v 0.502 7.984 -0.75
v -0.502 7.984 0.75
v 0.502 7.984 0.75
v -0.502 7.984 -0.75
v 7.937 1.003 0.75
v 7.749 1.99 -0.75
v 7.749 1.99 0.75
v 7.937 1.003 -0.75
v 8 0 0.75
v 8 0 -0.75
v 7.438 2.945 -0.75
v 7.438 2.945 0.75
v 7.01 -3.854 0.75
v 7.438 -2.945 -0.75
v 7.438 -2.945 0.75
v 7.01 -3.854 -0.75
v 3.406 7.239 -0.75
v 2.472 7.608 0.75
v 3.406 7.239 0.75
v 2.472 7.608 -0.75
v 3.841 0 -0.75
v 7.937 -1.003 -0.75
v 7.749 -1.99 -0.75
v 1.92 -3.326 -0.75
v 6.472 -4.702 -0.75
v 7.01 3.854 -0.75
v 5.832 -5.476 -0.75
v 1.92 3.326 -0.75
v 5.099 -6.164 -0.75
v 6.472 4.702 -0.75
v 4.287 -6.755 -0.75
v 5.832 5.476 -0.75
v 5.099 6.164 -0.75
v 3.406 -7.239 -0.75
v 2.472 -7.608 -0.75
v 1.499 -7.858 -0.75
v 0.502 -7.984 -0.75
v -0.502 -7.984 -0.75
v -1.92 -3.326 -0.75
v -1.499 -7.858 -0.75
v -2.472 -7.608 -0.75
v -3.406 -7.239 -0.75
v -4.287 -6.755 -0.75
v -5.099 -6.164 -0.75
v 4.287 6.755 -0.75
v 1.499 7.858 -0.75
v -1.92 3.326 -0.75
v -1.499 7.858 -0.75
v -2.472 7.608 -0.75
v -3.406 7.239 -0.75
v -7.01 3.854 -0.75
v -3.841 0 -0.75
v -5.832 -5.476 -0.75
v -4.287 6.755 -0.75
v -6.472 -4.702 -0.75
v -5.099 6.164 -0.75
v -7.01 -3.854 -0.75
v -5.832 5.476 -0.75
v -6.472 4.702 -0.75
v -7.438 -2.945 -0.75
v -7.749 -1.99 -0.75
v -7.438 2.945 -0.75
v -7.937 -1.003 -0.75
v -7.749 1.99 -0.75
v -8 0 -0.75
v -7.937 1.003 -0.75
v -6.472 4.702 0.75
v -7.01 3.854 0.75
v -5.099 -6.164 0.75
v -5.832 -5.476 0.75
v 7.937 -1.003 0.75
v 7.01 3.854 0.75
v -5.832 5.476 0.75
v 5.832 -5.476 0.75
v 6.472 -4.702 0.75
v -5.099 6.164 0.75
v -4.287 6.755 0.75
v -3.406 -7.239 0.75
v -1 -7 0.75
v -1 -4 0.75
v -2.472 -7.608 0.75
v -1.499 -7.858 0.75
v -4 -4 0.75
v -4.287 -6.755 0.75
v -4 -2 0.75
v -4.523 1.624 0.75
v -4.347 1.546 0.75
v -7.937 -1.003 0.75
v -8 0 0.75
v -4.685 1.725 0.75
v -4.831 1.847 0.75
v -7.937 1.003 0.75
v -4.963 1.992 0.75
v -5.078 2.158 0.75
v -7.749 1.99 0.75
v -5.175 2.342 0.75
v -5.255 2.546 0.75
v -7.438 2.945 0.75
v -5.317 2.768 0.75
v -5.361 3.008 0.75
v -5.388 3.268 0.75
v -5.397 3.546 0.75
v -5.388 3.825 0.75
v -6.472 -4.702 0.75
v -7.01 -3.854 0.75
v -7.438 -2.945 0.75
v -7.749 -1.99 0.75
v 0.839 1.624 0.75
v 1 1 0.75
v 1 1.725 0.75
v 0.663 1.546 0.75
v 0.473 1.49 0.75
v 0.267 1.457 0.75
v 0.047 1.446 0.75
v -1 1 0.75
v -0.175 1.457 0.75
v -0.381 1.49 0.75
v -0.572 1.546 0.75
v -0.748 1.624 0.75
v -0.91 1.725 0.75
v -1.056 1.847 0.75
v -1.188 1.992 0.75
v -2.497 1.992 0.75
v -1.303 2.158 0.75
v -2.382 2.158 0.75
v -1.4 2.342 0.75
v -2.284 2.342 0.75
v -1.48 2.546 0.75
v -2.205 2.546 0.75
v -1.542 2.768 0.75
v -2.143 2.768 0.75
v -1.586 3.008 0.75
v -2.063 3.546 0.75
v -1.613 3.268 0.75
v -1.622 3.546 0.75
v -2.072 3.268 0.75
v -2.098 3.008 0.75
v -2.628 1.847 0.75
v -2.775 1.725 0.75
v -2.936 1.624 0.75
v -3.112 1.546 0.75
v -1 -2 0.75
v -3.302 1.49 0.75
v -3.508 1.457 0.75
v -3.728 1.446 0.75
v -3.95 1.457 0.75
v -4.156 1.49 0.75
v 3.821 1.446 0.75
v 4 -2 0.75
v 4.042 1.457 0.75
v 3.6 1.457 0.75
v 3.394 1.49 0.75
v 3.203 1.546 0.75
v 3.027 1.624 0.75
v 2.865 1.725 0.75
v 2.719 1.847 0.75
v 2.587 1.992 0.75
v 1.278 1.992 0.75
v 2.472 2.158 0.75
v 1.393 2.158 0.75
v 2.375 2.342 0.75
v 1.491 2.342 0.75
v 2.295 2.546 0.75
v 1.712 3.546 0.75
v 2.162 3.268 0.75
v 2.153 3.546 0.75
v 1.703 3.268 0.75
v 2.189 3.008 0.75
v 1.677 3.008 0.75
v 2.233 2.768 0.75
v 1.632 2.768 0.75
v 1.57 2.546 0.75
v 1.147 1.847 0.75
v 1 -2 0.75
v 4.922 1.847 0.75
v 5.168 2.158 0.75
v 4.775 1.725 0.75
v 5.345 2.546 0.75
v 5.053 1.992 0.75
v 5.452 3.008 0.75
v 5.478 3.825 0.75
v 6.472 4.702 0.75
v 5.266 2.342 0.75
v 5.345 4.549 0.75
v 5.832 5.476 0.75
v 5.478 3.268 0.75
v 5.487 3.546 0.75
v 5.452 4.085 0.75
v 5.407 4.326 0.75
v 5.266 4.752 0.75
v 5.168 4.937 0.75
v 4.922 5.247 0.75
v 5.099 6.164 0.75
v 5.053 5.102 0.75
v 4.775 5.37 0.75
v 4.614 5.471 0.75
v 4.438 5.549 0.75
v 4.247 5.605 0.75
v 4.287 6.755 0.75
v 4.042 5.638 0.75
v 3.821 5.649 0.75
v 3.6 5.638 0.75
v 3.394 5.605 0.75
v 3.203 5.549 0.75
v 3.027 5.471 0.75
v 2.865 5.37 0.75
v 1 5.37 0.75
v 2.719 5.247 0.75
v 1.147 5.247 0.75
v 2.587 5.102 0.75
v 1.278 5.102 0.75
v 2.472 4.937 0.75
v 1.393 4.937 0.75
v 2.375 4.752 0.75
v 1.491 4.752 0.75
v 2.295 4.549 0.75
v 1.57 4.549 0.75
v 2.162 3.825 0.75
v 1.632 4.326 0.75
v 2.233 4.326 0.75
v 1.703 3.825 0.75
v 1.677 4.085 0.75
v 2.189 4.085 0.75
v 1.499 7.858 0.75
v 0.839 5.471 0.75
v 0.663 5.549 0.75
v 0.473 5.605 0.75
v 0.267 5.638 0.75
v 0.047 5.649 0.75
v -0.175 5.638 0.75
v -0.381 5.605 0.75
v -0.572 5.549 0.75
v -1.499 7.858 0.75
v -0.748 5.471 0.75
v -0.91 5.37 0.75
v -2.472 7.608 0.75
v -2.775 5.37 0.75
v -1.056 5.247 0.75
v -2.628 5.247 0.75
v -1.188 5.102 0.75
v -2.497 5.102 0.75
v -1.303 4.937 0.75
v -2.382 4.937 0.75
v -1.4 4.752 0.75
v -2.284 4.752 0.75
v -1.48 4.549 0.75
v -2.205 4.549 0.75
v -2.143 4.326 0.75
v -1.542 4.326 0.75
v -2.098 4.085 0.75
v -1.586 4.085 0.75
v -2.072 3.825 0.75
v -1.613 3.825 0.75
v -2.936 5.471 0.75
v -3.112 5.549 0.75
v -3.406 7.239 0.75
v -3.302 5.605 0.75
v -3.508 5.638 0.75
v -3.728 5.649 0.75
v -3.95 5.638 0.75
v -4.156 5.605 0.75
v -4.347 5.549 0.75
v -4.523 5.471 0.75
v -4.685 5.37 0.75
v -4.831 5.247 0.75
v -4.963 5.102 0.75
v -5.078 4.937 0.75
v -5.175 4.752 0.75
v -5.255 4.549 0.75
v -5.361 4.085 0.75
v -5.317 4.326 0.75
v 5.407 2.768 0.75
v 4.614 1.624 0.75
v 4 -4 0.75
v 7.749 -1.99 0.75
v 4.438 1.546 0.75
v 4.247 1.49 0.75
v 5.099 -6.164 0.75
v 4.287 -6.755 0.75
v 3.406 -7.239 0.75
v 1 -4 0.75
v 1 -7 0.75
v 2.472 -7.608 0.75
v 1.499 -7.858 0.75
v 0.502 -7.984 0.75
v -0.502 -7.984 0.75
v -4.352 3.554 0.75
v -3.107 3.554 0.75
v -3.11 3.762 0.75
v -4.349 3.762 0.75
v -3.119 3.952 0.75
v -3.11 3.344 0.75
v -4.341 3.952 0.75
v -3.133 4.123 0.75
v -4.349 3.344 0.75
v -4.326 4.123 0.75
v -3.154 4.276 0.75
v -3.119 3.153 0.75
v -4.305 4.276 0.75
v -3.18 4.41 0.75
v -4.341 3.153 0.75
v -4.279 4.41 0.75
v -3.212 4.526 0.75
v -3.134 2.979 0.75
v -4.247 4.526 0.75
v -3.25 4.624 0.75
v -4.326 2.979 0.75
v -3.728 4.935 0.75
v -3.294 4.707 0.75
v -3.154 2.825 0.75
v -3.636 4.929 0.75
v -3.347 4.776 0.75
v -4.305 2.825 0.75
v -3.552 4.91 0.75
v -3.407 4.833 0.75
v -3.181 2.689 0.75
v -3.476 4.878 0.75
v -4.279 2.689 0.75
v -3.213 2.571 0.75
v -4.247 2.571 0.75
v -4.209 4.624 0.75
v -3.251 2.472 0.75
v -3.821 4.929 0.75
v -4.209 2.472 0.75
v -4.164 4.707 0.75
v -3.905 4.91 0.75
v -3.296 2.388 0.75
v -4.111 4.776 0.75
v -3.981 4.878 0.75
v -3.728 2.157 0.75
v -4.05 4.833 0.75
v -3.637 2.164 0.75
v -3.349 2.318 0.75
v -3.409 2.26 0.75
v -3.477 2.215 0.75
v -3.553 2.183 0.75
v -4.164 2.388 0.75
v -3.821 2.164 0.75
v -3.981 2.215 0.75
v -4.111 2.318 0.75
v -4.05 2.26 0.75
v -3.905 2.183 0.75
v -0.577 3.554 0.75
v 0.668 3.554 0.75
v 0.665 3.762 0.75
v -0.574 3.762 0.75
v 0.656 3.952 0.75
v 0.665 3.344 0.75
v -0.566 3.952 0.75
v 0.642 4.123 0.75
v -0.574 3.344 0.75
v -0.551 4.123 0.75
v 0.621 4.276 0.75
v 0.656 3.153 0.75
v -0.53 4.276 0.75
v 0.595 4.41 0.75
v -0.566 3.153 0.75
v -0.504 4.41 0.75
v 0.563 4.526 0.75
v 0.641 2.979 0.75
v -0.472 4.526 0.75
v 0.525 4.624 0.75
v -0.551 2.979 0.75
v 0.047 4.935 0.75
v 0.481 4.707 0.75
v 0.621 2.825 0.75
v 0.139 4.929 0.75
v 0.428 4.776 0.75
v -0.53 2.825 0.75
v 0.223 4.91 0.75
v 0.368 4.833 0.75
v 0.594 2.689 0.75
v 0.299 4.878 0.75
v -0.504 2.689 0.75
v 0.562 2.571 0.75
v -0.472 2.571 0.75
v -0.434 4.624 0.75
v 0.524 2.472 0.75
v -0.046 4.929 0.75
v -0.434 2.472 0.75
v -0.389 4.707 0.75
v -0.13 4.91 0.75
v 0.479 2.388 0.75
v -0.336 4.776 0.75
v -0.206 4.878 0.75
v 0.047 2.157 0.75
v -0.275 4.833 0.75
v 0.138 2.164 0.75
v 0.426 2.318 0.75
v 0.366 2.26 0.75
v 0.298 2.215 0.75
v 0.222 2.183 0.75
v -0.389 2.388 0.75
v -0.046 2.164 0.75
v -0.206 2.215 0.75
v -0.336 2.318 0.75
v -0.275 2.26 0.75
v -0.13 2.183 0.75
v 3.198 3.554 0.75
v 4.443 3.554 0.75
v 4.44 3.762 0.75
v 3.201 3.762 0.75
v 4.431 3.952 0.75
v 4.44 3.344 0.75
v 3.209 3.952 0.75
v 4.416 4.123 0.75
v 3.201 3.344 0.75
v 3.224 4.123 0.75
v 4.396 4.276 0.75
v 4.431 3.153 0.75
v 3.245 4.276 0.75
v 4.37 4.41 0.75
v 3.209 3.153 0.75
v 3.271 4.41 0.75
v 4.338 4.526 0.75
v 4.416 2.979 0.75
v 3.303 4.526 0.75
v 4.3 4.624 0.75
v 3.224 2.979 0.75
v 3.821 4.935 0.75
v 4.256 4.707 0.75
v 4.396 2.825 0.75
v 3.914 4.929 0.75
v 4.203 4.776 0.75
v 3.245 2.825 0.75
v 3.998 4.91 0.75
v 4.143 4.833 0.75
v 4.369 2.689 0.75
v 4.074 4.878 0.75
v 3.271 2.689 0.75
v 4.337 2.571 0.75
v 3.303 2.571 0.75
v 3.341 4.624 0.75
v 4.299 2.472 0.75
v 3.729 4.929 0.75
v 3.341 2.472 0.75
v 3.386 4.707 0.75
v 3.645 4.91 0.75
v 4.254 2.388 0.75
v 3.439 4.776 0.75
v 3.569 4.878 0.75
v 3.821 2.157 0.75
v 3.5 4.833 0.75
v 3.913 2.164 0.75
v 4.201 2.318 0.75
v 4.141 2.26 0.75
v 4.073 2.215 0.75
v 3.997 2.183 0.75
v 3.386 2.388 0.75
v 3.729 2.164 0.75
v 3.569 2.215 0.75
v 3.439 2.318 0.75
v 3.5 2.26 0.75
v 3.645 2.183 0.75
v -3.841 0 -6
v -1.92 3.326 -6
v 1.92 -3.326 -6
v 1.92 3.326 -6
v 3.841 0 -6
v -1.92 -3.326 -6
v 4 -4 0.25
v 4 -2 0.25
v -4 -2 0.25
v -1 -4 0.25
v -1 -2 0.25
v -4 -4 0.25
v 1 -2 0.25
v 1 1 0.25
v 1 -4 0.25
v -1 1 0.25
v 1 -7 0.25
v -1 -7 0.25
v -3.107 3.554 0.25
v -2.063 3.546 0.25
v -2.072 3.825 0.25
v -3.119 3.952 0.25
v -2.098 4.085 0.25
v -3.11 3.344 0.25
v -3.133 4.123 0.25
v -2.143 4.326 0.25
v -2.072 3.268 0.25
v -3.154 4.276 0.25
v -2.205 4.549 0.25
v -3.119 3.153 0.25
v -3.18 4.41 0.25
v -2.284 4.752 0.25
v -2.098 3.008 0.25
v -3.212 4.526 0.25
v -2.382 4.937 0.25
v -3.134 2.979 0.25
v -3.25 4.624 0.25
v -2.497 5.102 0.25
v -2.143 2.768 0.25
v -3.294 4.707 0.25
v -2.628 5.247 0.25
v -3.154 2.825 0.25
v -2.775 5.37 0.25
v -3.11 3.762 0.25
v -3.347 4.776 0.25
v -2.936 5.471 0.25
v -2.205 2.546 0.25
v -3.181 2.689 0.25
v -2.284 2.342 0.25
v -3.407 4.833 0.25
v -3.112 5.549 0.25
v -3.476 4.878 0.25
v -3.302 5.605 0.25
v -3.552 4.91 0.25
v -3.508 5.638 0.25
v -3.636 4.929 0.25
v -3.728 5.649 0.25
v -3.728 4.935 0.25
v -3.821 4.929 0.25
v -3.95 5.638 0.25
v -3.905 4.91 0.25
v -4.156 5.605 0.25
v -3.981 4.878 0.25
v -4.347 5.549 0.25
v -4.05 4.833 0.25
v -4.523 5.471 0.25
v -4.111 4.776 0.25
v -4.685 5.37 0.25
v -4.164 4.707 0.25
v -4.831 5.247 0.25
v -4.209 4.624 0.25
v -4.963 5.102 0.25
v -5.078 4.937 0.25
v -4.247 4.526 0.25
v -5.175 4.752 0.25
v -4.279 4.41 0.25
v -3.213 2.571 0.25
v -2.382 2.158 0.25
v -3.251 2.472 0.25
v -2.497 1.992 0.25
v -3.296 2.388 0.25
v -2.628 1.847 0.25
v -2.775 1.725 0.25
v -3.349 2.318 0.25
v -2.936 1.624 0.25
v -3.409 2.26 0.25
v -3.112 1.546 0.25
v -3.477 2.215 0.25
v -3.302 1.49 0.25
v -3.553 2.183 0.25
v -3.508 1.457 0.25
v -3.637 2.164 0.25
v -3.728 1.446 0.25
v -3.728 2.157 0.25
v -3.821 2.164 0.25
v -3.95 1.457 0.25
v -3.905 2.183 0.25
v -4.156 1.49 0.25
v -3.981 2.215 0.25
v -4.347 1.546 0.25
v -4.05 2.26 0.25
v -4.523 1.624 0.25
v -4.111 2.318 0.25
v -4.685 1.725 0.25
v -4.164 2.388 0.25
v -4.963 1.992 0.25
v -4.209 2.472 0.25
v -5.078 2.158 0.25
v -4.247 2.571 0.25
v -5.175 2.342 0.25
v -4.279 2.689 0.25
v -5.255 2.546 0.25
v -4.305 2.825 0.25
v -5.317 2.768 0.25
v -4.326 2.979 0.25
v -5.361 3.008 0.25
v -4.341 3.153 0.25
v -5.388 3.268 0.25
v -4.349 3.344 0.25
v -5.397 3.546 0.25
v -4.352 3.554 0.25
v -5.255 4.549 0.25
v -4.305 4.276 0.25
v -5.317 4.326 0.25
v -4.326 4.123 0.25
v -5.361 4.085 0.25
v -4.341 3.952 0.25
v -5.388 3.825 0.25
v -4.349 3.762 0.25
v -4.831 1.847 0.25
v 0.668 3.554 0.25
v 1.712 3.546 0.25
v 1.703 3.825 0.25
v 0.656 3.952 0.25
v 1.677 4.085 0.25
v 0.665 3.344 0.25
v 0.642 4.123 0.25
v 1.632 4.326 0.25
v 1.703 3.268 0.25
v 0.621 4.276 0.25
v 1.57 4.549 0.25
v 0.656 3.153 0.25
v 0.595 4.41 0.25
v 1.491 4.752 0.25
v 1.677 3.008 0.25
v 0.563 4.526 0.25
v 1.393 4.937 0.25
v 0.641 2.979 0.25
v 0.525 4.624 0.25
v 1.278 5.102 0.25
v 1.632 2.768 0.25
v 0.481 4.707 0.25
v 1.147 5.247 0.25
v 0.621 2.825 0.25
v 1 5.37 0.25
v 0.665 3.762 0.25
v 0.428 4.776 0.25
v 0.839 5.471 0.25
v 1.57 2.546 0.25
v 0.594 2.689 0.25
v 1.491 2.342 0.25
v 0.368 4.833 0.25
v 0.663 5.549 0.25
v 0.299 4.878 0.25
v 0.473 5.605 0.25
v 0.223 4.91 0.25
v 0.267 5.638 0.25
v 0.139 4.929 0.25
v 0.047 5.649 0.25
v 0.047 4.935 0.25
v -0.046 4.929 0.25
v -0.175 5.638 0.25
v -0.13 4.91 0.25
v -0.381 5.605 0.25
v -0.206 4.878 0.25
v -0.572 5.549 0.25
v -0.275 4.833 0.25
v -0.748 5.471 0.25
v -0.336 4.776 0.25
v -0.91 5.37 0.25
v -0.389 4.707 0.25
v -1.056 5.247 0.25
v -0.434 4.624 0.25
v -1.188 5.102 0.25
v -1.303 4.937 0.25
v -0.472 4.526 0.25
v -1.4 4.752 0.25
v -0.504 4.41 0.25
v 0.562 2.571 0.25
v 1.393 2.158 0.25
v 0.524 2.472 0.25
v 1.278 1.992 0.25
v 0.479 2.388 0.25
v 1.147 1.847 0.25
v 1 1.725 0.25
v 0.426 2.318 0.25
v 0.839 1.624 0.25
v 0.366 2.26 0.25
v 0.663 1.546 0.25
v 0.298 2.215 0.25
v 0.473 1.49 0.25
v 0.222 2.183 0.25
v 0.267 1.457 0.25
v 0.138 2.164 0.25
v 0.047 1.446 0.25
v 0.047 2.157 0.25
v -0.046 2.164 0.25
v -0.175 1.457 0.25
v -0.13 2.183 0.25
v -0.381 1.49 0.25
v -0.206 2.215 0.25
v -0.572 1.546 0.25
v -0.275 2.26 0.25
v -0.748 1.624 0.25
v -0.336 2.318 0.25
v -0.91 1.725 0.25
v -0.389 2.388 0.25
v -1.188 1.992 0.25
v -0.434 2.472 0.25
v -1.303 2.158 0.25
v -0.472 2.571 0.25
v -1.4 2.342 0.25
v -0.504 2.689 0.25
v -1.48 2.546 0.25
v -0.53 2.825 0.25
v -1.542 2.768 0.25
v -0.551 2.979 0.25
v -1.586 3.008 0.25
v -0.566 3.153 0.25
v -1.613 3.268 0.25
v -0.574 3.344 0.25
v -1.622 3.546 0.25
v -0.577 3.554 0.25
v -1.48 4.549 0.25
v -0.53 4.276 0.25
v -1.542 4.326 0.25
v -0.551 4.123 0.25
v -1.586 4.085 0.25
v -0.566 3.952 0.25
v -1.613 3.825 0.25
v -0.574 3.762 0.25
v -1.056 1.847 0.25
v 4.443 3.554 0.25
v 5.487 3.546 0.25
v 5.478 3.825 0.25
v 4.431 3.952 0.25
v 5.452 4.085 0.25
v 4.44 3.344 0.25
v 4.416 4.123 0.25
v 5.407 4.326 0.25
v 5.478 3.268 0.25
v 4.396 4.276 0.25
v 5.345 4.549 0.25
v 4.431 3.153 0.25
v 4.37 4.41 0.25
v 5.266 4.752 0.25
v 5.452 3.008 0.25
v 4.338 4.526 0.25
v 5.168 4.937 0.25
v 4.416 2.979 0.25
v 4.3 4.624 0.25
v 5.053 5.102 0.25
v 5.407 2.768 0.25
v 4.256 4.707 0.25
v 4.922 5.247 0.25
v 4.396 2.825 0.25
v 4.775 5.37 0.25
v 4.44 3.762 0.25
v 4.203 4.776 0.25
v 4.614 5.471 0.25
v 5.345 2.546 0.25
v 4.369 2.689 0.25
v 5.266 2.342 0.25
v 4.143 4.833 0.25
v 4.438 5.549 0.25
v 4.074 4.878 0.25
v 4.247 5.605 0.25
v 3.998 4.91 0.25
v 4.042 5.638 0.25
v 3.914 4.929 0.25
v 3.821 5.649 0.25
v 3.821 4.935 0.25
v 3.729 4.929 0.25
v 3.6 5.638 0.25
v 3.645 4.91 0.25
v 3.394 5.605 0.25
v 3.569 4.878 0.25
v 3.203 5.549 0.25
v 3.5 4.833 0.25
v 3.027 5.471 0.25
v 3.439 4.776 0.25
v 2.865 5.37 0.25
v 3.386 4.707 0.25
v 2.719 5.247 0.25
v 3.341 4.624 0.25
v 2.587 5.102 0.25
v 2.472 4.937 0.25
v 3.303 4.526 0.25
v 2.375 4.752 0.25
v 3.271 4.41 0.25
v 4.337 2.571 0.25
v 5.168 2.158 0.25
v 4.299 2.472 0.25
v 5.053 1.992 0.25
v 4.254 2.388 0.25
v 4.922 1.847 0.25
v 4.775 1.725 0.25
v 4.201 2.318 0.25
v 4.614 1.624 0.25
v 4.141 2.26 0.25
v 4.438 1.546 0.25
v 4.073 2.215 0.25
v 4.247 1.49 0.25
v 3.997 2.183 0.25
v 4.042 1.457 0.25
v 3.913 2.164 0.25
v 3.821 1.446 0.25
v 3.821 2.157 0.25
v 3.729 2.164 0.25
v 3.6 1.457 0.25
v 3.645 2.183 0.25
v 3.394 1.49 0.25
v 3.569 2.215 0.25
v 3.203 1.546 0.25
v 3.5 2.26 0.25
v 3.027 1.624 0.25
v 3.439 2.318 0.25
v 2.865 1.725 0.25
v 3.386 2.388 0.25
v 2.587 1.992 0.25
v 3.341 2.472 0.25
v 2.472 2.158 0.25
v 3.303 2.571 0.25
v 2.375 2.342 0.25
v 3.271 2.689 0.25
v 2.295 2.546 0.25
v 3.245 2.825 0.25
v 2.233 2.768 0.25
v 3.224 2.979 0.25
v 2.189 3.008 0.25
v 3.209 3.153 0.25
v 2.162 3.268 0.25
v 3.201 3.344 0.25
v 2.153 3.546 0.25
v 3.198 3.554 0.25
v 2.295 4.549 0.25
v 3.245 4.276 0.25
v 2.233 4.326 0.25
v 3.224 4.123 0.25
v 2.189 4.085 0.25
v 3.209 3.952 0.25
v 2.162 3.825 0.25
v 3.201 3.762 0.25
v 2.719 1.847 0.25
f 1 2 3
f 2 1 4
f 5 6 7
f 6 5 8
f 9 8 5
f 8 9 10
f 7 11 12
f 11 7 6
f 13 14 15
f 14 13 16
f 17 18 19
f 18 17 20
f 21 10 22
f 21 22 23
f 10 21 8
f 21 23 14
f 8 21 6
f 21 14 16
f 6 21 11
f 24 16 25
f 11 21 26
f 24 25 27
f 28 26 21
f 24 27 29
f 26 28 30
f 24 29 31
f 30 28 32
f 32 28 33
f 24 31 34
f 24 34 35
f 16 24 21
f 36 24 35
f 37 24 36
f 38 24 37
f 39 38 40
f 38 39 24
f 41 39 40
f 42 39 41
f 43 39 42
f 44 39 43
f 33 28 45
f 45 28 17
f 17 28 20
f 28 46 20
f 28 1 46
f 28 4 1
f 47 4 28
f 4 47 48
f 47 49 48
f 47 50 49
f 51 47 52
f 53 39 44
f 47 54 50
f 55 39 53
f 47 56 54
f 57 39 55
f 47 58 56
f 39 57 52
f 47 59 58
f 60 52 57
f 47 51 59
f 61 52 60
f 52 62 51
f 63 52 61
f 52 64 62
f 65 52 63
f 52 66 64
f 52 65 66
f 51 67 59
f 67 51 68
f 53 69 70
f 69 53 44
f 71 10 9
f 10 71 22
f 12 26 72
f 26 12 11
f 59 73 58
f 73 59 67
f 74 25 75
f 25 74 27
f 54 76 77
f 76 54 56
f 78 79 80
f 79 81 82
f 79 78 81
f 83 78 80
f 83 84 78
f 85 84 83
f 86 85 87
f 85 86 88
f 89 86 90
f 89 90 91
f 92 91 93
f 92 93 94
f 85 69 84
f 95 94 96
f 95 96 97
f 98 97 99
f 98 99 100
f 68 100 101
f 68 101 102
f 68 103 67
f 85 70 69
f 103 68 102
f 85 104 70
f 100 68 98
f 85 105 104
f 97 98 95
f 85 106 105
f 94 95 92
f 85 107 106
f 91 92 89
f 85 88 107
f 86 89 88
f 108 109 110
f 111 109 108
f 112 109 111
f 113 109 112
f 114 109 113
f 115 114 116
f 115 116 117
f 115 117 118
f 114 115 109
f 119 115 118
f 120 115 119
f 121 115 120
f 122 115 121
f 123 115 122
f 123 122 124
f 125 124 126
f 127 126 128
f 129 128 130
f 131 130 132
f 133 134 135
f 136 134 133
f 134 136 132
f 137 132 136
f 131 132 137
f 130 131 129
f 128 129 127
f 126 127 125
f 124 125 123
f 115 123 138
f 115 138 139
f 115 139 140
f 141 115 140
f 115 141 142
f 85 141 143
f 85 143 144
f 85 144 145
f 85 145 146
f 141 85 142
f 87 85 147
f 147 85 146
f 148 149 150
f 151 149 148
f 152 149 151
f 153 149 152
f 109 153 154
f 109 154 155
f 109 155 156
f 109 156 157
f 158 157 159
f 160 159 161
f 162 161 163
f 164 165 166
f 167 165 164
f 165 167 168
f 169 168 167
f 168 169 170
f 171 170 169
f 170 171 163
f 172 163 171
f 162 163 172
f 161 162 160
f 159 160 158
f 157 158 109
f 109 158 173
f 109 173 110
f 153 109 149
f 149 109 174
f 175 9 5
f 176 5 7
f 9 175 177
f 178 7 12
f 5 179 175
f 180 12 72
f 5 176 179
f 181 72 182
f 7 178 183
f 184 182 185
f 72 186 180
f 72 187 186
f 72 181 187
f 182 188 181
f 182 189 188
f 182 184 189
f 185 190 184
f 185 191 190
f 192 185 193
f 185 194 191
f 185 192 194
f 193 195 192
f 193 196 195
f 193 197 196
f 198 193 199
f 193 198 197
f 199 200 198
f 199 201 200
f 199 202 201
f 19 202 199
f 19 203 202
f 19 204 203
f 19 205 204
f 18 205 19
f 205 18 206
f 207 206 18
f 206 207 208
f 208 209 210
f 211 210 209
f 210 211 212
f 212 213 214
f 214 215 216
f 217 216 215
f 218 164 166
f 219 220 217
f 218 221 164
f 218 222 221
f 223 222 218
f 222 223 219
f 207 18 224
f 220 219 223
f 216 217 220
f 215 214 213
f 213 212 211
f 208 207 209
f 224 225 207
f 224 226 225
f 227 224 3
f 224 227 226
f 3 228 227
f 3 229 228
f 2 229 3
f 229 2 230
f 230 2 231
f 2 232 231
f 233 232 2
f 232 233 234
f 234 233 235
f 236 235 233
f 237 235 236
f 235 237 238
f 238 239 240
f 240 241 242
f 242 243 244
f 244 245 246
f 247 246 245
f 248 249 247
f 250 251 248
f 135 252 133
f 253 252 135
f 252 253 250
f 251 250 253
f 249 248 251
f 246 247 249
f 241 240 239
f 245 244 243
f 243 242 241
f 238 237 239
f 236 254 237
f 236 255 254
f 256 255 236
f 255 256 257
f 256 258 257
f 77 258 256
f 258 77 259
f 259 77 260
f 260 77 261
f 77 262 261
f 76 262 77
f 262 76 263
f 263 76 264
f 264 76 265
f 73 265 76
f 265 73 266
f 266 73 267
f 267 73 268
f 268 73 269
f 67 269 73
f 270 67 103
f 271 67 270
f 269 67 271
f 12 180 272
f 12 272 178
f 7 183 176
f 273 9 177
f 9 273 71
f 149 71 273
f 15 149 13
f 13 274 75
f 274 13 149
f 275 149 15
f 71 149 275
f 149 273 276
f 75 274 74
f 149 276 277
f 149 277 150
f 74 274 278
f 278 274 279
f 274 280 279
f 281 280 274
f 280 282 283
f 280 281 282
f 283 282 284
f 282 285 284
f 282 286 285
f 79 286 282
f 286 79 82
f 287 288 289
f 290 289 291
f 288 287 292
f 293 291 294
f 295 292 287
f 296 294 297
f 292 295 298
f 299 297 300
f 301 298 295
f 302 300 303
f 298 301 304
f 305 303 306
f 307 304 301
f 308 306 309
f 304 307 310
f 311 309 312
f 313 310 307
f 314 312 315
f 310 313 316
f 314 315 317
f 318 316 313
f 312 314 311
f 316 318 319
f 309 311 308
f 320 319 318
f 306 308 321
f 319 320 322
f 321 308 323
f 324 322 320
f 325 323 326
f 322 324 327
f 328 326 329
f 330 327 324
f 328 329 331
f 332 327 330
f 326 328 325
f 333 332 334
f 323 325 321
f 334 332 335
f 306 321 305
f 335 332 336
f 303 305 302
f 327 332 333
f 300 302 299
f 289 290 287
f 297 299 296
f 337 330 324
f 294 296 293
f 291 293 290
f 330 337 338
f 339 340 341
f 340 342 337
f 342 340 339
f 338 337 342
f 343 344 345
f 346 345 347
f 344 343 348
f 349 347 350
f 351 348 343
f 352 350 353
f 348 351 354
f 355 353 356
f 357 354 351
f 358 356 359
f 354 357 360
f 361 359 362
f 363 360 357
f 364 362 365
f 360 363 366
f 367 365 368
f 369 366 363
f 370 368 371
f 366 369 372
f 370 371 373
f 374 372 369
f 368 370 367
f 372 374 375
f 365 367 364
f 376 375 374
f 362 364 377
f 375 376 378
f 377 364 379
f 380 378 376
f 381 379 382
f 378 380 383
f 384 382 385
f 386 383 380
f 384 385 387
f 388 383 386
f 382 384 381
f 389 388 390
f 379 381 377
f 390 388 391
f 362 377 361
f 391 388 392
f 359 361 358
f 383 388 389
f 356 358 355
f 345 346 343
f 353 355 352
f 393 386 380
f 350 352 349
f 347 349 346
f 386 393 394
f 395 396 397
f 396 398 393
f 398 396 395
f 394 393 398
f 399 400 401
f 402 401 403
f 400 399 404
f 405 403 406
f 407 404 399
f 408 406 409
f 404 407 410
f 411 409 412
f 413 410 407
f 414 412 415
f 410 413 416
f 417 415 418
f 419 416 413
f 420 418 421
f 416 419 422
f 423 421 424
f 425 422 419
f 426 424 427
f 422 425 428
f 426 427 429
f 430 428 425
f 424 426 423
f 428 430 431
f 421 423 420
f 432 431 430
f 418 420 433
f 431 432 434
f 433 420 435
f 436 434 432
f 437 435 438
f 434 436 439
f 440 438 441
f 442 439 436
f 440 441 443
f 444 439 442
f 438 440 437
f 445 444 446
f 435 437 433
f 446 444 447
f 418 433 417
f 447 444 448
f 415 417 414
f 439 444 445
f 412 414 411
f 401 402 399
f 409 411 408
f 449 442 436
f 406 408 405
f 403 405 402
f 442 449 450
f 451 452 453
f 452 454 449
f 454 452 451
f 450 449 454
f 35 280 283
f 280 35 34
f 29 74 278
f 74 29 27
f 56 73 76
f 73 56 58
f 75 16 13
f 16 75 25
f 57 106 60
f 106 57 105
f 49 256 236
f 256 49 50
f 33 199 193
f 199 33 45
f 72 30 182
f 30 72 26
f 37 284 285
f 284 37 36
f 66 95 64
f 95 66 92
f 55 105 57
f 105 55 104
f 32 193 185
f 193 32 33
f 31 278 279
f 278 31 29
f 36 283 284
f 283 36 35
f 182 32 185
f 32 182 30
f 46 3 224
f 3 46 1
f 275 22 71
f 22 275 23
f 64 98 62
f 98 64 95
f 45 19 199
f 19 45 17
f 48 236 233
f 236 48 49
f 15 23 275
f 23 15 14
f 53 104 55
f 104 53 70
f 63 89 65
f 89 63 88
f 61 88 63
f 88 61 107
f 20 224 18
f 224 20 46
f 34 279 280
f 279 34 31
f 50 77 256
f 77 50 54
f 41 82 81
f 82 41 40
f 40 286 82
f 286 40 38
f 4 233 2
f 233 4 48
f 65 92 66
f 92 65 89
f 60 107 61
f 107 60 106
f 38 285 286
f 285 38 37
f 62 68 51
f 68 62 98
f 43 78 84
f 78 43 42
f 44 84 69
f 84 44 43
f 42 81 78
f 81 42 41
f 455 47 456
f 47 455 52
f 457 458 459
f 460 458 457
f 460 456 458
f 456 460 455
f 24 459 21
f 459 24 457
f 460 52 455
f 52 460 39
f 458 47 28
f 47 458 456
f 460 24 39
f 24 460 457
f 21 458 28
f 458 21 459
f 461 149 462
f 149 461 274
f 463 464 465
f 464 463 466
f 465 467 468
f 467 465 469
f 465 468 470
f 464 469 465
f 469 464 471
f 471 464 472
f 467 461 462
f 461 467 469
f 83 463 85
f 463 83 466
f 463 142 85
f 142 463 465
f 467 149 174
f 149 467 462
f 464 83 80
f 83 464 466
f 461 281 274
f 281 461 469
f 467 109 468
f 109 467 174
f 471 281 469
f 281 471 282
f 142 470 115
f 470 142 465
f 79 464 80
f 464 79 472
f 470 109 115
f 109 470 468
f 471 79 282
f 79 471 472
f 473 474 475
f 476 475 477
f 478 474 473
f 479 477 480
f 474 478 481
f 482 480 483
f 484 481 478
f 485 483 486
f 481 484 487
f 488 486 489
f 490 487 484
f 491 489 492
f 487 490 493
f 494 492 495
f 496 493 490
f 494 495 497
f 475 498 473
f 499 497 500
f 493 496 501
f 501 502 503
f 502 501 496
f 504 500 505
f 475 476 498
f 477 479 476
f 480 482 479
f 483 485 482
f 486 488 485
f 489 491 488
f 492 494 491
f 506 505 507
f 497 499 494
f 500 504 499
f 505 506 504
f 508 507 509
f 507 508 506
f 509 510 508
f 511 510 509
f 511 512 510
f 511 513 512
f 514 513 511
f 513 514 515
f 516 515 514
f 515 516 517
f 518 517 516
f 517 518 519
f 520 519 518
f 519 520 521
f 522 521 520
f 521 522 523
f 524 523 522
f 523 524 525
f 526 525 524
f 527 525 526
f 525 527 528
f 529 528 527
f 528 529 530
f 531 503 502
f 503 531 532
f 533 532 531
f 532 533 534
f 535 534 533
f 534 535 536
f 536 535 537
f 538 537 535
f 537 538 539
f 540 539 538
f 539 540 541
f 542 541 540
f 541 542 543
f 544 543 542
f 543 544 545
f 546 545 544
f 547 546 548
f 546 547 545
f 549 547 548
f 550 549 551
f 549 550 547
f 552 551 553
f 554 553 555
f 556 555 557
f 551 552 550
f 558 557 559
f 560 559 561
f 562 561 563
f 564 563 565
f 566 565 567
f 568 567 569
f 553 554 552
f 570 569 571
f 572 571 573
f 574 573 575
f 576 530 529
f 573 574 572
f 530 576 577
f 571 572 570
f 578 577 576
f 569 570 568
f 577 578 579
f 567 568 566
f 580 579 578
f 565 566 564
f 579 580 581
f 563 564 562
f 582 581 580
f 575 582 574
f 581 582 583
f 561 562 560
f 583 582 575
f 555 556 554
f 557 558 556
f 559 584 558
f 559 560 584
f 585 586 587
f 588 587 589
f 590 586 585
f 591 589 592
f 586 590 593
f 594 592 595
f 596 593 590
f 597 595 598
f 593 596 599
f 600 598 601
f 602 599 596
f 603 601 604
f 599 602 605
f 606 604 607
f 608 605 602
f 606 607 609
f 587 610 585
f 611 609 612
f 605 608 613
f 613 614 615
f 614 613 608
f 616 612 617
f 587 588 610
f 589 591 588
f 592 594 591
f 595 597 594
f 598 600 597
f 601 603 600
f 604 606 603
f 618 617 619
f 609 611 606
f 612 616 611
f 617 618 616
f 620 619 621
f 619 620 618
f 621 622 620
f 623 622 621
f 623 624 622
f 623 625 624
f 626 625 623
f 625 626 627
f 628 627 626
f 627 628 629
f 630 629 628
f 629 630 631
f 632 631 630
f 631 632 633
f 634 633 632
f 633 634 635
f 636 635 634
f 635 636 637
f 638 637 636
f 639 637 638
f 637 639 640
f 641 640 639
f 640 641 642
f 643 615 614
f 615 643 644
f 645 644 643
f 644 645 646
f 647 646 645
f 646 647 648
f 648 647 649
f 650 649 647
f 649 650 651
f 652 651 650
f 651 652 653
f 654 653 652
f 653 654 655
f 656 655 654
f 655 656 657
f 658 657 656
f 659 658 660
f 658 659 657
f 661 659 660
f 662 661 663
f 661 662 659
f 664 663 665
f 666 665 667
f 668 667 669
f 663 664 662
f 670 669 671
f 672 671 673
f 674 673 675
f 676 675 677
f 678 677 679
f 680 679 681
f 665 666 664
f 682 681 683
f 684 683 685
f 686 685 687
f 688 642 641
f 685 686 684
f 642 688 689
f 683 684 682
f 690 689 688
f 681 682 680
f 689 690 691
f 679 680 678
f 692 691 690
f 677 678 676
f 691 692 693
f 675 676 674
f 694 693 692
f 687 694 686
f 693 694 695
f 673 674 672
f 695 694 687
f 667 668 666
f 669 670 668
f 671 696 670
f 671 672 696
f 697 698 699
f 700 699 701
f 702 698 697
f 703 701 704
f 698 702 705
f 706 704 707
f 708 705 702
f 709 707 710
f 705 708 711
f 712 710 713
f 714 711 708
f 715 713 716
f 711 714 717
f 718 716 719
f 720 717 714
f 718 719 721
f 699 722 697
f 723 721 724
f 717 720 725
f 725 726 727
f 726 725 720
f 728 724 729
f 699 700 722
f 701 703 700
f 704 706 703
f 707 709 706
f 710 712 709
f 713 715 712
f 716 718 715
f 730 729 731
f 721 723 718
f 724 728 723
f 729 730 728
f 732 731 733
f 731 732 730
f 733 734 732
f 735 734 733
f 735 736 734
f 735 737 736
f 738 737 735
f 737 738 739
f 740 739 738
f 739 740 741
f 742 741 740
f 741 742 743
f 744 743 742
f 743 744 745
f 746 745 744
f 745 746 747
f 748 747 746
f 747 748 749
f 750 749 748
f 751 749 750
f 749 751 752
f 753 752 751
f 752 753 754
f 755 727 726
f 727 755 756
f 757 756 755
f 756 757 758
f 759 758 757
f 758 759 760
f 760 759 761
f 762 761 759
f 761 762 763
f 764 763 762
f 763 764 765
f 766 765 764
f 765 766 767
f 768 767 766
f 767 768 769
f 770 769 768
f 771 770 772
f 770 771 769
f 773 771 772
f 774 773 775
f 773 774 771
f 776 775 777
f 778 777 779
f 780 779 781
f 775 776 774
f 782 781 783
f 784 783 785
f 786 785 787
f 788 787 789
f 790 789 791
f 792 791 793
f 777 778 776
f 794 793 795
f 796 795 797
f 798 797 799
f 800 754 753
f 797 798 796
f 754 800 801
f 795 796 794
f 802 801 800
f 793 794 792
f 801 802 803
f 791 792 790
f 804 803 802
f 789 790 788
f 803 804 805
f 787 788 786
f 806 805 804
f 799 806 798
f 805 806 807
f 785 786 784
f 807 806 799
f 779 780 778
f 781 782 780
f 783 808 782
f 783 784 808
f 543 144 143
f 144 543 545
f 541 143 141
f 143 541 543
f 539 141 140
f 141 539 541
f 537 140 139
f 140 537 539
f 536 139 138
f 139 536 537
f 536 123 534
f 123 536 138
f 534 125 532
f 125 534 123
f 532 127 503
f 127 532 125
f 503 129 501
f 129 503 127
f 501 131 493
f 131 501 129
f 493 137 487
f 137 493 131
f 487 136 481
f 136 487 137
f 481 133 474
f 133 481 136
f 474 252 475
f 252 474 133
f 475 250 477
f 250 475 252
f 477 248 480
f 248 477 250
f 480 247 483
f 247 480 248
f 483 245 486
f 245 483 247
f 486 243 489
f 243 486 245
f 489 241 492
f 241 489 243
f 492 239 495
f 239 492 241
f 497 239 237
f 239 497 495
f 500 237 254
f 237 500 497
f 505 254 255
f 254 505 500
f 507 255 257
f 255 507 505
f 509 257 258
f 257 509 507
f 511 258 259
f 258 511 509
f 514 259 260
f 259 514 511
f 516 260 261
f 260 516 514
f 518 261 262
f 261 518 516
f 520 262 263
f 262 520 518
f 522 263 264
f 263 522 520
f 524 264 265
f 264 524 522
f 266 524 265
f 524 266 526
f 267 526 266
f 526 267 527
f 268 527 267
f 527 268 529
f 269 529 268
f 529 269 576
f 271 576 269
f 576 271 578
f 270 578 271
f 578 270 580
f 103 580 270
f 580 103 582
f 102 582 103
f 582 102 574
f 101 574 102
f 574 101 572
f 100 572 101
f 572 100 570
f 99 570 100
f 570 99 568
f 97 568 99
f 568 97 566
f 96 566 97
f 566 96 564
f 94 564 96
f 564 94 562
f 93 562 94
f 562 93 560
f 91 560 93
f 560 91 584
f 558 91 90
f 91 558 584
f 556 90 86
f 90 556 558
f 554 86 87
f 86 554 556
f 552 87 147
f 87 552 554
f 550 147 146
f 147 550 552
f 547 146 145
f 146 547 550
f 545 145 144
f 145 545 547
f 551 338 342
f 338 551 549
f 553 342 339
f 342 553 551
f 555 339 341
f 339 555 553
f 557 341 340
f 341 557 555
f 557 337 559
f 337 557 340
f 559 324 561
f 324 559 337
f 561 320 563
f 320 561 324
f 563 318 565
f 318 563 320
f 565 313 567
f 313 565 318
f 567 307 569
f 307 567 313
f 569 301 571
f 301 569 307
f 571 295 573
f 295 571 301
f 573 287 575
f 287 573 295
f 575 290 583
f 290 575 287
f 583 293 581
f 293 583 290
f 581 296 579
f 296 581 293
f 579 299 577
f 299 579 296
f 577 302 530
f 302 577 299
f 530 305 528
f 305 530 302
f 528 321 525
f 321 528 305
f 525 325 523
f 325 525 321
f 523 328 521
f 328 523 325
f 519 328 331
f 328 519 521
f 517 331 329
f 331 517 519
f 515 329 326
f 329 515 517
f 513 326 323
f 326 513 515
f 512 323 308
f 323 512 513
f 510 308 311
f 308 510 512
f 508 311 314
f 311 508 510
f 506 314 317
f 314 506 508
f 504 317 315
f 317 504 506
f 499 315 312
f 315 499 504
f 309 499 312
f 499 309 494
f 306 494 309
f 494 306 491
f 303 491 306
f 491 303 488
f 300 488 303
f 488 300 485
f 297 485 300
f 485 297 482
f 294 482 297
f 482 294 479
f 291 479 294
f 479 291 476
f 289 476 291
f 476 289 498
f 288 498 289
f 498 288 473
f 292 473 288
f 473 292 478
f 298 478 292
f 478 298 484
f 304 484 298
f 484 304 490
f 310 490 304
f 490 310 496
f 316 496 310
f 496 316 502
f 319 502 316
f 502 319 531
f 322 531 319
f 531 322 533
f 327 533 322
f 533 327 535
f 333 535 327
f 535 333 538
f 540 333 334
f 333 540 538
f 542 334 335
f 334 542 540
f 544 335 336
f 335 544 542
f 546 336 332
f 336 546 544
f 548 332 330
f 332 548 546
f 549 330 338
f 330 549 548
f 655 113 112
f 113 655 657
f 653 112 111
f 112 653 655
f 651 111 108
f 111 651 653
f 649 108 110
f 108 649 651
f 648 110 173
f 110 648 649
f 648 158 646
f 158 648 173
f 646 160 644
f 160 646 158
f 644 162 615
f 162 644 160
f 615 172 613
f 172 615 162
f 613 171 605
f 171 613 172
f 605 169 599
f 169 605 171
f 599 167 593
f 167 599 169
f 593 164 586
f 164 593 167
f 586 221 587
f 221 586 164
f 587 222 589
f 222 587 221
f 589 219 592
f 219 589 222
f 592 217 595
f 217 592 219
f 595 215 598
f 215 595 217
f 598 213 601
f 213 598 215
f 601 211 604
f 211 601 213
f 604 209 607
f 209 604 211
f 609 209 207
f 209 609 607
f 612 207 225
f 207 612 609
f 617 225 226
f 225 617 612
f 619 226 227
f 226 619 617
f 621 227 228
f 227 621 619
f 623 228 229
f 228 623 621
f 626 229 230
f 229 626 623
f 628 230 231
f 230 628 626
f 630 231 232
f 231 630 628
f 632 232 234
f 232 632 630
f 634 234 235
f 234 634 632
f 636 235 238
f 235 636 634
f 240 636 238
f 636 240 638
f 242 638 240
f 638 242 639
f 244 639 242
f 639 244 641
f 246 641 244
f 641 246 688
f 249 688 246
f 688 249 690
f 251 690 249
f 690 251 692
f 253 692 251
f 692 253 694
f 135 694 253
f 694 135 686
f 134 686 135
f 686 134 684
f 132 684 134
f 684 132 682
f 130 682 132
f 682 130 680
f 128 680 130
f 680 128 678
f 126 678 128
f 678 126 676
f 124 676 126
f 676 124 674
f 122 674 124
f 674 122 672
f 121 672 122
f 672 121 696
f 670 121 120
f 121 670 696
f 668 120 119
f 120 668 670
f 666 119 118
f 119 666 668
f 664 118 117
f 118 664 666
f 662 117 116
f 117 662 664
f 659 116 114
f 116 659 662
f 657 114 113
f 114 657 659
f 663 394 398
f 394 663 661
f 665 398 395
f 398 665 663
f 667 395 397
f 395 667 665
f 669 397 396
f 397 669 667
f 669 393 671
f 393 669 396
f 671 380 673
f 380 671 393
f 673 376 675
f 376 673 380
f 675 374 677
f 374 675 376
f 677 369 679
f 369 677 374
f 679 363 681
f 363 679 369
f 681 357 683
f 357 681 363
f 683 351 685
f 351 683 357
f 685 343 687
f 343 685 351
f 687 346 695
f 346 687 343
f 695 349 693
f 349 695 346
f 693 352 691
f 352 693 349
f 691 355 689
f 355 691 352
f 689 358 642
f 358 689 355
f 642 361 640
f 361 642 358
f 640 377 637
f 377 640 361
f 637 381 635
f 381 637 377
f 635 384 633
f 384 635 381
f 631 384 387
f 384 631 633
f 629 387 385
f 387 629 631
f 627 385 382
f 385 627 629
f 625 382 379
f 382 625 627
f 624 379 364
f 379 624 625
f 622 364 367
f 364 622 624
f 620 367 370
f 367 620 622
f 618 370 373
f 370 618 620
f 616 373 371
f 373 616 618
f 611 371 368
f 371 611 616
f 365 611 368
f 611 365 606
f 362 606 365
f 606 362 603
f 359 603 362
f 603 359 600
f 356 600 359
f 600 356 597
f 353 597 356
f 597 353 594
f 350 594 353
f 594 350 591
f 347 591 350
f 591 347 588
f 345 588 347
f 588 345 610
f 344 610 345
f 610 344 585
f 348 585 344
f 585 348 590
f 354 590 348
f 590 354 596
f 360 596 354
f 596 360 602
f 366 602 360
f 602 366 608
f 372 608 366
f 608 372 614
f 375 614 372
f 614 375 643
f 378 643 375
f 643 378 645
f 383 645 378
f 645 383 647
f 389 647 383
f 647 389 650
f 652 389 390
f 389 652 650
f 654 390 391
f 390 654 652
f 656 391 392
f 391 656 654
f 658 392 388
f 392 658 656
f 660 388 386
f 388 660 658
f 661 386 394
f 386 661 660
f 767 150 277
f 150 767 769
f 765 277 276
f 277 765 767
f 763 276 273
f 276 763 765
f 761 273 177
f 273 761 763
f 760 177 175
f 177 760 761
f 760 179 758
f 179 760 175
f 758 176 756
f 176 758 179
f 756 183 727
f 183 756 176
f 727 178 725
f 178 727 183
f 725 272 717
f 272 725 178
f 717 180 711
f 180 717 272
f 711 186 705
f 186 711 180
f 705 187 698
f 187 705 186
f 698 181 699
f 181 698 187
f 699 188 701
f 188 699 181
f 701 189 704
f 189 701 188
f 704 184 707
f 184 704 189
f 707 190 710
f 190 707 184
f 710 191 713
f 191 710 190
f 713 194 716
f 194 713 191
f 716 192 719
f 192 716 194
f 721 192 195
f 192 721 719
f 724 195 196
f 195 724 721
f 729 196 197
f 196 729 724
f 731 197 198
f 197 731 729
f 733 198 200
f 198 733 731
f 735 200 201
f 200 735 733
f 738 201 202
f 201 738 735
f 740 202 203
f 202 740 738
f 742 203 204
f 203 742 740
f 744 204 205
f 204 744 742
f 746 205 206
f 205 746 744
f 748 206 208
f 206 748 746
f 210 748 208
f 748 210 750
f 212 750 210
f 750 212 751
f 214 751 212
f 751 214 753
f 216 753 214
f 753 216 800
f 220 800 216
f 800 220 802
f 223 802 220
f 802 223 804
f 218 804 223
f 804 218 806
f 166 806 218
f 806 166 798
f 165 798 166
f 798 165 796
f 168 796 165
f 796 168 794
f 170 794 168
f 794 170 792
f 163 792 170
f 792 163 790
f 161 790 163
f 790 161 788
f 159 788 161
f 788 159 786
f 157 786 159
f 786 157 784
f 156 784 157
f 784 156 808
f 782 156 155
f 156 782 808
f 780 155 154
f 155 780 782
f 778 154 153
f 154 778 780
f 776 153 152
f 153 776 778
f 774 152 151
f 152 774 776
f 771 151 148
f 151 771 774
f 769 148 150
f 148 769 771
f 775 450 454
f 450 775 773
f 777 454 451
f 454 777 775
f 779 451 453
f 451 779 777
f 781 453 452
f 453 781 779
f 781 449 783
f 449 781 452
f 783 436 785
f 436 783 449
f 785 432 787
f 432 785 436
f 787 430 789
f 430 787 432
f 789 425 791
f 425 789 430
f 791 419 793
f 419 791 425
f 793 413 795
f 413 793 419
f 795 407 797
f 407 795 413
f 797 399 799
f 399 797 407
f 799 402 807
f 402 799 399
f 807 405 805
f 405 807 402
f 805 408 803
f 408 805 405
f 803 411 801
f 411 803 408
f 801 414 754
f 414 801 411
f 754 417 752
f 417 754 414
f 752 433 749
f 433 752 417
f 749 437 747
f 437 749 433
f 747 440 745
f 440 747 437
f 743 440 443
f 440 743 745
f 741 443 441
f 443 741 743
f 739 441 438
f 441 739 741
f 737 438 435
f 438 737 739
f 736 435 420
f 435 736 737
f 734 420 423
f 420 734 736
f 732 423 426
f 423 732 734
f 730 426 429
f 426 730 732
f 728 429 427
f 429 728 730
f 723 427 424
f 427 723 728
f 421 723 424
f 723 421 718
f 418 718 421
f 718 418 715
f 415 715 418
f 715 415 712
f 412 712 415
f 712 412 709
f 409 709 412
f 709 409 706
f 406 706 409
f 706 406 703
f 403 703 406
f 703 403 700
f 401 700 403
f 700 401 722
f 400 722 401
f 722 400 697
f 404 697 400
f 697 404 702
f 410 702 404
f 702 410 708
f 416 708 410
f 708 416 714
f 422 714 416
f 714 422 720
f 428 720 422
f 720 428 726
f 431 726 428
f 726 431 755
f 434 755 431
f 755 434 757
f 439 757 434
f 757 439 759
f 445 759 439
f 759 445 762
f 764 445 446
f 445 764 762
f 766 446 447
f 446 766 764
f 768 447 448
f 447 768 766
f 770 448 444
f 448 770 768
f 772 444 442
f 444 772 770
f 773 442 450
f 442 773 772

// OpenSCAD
$fn = 50;


difference() {
	union() {
		translate(v = [0, 0, -0.7500000000]) {
			cylinder(h = 1.5000000000, r = 8.0000000000);
		}
		translate(v = [0, 0, -6]) {
			linear_extrude(height = 6) {
				polygon(points = [[3.8408550000, 0.0000000000], [1.9204275000, 3.3262780023], [-1.9204275000, 3.3262780023], [-3.8408550000, 0.0000000000], [-1.9204275000, -3.3262780023], [1.9204275000, -3.3262780023]]);
			}
		}
	}
	union() {
		#translate(v = [-4.0000000000, -4.0000000000, 0.2500000000]) {
			cube(size = [8, 2, 0.5000000000]);
		}
		#translate(v = [-1.0000000000, -7.0000000000, 0.2500000000]) {
			cube(size = [2, 8, 0.5000000000]);
		}
		#translate(v = [0, 3.5000000000, 0.2500000000]) {
			linear_extrude(height = 0.5000000000) {
				text(font = "SegoiUI:Bold", halign = "center", size = 4, text = "000", valign = "center");
			}
		}
	}
}
